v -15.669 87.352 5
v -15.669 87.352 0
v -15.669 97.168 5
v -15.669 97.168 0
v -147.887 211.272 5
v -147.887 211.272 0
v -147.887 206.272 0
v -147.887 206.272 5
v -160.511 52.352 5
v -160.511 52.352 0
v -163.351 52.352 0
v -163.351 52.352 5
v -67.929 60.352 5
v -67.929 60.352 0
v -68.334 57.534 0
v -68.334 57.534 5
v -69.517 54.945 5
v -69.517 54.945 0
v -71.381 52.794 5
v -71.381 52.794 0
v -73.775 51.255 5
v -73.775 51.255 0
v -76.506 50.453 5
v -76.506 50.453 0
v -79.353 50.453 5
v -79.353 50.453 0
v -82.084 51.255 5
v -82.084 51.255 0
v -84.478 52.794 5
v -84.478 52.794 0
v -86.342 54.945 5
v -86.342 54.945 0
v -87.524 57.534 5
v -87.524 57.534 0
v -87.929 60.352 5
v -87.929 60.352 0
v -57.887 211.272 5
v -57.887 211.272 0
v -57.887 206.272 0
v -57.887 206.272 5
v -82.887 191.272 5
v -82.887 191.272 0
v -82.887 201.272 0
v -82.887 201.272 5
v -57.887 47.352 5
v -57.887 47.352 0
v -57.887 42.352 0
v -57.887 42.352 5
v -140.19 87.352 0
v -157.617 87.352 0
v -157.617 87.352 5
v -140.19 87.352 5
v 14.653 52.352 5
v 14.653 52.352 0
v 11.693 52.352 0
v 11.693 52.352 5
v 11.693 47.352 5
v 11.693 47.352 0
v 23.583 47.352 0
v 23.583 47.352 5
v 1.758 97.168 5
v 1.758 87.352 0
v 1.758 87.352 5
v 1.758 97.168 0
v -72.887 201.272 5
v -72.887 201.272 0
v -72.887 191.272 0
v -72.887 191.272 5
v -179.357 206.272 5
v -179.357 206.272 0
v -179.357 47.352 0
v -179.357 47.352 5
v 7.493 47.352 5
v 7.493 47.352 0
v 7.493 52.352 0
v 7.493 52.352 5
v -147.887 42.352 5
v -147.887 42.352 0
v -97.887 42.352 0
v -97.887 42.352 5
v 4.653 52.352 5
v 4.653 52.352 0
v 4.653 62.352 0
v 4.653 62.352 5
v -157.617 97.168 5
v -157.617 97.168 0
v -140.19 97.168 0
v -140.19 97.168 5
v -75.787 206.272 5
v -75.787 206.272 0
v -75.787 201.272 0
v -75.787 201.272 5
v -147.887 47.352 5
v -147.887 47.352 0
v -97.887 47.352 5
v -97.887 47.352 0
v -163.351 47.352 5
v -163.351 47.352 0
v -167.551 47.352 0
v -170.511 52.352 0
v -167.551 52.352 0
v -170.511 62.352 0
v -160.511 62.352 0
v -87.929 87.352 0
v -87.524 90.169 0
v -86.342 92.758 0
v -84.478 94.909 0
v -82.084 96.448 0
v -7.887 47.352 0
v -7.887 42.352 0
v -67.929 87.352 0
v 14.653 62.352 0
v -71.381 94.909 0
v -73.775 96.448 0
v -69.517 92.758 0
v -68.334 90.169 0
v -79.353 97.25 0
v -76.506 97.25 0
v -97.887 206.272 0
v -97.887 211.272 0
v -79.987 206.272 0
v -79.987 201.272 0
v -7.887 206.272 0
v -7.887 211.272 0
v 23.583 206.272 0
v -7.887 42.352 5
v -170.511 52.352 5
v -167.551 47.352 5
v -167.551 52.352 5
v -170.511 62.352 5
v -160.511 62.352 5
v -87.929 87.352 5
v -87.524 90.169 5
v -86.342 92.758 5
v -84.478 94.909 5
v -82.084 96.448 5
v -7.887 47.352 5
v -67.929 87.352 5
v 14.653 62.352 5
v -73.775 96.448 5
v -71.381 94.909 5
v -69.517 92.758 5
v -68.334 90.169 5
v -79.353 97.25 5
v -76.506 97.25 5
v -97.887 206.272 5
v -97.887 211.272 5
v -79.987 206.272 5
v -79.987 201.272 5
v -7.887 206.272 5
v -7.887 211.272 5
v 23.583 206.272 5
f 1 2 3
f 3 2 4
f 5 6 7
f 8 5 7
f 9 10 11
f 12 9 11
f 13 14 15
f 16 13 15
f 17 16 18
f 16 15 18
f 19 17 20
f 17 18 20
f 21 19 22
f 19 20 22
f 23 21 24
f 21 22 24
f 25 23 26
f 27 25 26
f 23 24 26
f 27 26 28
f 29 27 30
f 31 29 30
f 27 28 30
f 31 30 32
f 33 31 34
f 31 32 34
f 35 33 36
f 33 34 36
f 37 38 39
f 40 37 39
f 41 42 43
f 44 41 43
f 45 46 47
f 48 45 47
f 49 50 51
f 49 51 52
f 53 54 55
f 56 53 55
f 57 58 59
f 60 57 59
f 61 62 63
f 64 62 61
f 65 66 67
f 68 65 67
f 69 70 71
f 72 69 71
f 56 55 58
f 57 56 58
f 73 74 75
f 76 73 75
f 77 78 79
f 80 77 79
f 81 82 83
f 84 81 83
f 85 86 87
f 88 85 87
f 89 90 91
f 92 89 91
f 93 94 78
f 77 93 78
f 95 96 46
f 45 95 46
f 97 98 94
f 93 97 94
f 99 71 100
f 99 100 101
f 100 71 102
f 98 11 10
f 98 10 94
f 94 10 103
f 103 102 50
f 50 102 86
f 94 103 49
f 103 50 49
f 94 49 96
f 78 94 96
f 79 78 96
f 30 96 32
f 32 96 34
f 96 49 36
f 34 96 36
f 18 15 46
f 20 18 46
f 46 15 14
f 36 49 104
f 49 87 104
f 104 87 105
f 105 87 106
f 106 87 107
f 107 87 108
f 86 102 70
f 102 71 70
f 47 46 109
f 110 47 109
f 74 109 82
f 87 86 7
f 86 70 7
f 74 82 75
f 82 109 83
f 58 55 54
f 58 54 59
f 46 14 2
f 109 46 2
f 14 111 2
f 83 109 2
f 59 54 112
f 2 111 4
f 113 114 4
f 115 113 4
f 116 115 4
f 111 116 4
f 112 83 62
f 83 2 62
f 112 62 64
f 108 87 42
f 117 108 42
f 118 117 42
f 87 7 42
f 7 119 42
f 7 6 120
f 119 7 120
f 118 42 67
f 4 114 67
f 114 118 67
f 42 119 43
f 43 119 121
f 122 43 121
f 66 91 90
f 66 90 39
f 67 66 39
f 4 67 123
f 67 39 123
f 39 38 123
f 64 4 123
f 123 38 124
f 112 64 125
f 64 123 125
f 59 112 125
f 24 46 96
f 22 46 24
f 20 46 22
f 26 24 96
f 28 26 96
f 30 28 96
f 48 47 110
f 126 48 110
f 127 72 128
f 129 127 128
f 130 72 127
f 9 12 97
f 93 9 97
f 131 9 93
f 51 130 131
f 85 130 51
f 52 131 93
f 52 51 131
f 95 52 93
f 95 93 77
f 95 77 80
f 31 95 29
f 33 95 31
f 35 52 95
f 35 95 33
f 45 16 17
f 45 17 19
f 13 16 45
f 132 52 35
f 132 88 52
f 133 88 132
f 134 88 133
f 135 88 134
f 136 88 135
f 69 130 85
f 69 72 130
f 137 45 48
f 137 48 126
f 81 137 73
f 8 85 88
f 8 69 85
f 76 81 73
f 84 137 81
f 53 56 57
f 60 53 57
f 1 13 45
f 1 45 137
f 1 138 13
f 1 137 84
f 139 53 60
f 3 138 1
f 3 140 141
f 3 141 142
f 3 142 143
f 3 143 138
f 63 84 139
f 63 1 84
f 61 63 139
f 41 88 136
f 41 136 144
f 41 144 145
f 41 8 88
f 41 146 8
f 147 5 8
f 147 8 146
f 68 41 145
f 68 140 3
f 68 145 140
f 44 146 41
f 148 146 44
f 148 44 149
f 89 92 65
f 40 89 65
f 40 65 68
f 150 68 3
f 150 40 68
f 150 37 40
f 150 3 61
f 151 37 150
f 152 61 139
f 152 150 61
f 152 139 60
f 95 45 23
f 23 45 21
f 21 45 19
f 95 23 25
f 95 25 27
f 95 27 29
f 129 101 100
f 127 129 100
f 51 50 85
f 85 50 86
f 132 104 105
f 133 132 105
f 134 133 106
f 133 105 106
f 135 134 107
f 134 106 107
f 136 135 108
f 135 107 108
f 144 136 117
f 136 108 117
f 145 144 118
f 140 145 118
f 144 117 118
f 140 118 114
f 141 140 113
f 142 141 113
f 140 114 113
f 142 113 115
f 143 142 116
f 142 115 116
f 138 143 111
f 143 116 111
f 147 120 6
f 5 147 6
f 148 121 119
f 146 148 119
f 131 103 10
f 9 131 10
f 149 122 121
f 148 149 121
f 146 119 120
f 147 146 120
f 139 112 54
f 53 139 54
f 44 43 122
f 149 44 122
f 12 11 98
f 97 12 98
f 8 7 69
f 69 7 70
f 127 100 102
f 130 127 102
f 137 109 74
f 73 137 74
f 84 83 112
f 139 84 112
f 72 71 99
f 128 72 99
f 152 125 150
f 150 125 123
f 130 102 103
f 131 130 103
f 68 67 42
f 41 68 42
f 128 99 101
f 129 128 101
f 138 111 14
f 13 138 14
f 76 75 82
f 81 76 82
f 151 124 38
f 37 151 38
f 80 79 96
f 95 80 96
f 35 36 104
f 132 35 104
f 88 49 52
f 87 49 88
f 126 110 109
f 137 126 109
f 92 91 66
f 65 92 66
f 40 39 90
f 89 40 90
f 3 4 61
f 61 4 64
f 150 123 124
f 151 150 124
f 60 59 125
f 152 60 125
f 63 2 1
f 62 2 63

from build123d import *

# Parameters (mm, degrees)
ESQUISSE1_W        = 17.426618769
ESQUISSE1_H        = 9.816495883
BOSS_EXTRU_2_DEPTH = 5


with BuildPart() as part:
    # Esquisse1 → Boss.-Extru.2 (new body)
    with BuildSketch(Plane.XY):
        Polygon((-179.357380563, 206.271549111), (-179.357380563, 47.351549111), (-167.551475198, 47.351549111), (-167.551475198, 52.351549111), (-170.511475198, 52.351549111), (-170.511475198, 62.351549111), (-160.511475198, 62.351549111), (-160.511475198, 52.351549111), (-163.351475198, 52.351549111), (-163.351475198, 47.351549111), (-161.517380563, 47.351549111), (-147.887380563, 47.351549111), (-147.887380563, 42.351549111), (-97.887380563, 42.351549111), (-97.887380563, 47.351549111), (-79.987380563, 47.351549111), (-73.667421864, 47.351549111), (-57.887380563, 47.351549111), (-57.887380563, 42.351549111), (-7.887380563, 42.351549111), (-7.887380563, 47.351549111), (7.492660738, 47.351549111), (7.492660738, 52.351549111), (4.652660738, 52.351549111), (4.652660738, 62.351549111), (14.652660738, 62.351549111), (14.652660738, 52.351549111), (11.692660738, 52.351549111), (11.692660738, 47.351549111), (18.012619437, 47.351549111), (23.582619437, 47.351549111), (23.582619437, 206.271549111), (-7.887380563, 206.271549111), (-7.887380563, 211.271549111), (-57.887380563, 211.271549111), (-57.887380563, 206.271549111), (-73.667421864, 206.271549111), (-75.787380563, 206.271549111), (-75.787380563, 201.271549111), (-72.887380563, 201.271549111), (-72.887380563, 191.271549111), (-82.887380563, 191.271549111), (-82.887380563, 201.271549111), (-79.987380563, 201.271549111), (-79.987380563, 206.271549111), (-97.887380563, 206.271549111), (-97.887380563, 211.271549111), (-147.887380563, 211.271549111), (-147.887380563, 206.271549111), align=None)
        with BuildLine():
            Line((-87.92940723, 60.351549111), (-87.92940723, 87.351549111))
            ThreePointArc((-87.92940723, 87.351549111), (-77.92940723, 97.351549111), (-67.92940723, 87.351549111))
            Line((-67.92940723, 87.351549111), (-67.92940723, 60.351549111))
            ThreePointArc((-67.92940723, 60.351549111), (-77.92940723, 50.351549111), (-87.92940723, 60.351549111))
        make_face(mode=Mode.SUBTRACT)
        with Locations((-6.955391392, 92.259797053)):
            Rectangle(ESQUISSE1_W, ESQUISSE1_H, mode=Mode.SUBTRACT)
        with Locations((-148.903423068, 92.259797053)):
            Rectangle(ESQUISSE1_W, ESQUISSE1_H, mode=Mode.SUBTRACT)
    extrude(amount=BOSS_EXTRU_2_DEPTH)


solid = part.part
